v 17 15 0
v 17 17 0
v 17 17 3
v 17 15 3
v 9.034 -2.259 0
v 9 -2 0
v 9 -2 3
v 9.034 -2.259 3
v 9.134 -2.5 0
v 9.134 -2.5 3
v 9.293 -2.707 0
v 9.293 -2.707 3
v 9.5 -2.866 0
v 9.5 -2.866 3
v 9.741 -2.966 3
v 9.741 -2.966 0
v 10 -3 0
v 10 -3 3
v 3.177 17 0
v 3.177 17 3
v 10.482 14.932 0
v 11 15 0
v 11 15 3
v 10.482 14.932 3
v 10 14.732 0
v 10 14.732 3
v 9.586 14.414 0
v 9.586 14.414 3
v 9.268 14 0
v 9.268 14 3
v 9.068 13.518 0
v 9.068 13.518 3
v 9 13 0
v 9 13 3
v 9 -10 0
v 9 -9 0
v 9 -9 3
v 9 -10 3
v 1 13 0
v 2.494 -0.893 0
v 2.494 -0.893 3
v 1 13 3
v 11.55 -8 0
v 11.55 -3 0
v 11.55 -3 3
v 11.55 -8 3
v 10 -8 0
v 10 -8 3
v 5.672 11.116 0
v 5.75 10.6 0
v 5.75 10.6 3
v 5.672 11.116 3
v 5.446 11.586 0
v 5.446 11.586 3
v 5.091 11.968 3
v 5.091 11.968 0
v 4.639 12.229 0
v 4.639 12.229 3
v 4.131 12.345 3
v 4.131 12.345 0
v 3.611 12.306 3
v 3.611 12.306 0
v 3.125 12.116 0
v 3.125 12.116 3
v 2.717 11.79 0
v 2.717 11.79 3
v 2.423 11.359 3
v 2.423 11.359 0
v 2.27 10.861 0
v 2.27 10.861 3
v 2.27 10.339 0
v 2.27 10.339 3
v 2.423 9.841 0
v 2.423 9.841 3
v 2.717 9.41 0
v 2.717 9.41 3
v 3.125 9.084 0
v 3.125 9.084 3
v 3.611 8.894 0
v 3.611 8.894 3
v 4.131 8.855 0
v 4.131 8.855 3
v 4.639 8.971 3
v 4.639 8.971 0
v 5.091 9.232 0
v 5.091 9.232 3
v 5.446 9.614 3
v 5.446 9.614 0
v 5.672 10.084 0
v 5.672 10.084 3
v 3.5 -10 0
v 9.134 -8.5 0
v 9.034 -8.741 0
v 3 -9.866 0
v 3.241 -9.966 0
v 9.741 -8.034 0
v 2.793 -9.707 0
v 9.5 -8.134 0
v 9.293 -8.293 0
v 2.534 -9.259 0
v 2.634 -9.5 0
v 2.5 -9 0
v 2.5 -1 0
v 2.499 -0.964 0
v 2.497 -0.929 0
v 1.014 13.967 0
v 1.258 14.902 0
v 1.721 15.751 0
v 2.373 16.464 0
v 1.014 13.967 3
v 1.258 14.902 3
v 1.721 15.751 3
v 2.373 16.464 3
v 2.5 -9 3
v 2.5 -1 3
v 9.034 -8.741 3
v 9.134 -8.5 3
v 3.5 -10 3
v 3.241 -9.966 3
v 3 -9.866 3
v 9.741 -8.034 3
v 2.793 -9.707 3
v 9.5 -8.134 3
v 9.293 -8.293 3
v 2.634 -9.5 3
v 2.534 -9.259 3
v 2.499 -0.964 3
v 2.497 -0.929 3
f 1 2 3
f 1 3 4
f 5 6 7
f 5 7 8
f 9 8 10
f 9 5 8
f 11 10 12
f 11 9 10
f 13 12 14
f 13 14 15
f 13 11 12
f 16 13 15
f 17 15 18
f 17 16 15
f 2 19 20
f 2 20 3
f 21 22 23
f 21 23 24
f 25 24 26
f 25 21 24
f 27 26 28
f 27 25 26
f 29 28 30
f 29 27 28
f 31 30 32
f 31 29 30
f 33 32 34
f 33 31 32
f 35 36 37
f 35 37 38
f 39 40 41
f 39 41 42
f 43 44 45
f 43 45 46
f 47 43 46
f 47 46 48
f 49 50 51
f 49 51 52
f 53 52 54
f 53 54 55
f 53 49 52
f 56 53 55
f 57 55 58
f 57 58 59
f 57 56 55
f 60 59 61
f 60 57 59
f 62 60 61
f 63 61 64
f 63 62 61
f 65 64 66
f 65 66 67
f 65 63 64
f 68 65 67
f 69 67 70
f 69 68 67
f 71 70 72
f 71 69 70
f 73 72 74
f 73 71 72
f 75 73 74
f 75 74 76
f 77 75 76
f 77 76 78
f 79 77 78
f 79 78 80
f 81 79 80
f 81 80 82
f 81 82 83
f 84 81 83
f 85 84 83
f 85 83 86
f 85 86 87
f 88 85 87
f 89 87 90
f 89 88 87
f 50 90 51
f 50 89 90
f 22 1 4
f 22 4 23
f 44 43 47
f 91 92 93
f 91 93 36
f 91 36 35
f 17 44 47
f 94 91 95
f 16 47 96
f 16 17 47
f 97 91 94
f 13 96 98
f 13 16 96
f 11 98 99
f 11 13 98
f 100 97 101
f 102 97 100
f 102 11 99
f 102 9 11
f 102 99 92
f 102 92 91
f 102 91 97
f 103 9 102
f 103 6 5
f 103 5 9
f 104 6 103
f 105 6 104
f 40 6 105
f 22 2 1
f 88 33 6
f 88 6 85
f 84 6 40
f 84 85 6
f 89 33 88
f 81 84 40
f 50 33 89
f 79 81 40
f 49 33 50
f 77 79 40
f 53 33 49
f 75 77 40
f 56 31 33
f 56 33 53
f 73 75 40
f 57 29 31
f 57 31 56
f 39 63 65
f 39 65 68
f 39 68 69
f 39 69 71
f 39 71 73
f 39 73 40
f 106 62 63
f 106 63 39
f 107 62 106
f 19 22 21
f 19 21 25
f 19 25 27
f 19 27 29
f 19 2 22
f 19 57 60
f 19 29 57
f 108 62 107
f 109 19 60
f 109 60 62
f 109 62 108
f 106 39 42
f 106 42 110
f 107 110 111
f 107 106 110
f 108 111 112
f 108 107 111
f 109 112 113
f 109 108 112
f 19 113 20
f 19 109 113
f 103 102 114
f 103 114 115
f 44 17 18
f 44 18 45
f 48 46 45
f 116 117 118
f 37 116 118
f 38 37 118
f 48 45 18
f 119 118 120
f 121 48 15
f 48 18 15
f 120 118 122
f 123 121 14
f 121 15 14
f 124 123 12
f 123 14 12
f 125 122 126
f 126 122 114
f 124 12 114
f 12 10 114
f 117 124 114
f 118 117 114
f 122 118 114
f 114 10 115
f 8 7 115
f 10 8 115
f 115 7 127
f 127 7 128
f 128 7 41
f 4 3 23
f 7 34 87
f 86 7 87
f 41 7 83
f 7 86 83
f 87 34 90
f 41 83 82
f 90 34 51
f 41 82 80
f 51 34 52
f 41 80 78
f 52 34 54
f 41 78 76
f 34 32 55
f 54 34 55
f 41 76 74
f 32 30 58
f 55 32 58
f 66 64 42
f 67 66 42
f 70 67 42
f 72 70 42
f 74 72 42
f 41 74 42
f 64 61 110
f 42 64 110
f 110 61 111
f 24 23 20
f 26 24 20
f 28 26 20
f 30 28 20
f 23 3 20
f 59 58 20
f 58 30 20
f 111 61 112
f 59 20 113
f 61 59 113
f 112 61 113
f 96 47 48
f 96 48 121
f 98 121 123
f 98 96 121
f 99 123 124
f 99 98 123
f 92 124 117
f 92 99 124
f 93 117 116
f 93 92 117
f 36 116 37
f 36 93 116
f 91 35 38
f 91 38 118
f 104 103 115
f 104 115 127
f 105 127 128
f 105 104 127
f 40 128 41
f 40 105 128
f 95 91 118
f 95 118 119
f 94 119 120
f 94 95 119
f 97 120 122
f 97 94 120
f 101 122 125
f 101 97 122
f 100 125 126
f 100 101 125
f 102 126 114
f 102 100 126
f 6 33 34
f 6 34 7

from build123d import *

# Parameters (mm, degrees)
ESQUISSE1_R        = 1.75
BOSS_EXTRU_1_DEPTH = 3


with BuildPart() as part:
    # Esquisse1 → Boss.-Extru.1 (new body)
    with BuildSketch(Plane.XY):
        with BuildLine():
            Line((3.177327772, 17), (17, 17))
            Line((17, 17), (17, 15))
            Line((17, 15), (11, 15))
            ThreePointArc((11, 15), (9.585786438, 14.414213562), (9, 13))
            Line((9, 13), (9, -2))
            ThreePointArc((9, -2), (9.292893219, -2.707106781), (10, -3))
            Line((10, -3), (11.55, -3))
            Line((11.55, -3), (11.55, -8))
            Line((11.55, -8), (10, -8))
            ThreePointArc((10, -8), (9.292893219, -8.292893219), (9, -9))
            Line((9, -9), (9, -10))
            Line((9, -10), (3.5, -10))
            ThreePointArc((3.5, -10), (2.792893219, -9.707106781), (2.5, -9))
            Line((2.5, -9), (2.5, -1))
            ThreePointArc((2.5, -1), (2.498565392, -0.946454153), (2.494265684, -0.89306194))
            Line((2.494265684, -0.89306194), (1, 13))
            ThreePointArc((1, 13), (1.463823787, 15.340120425), (3.177327772, 17))
        make_face()
        with Locations((4, 10.6)):
            Circle(ESQUISSE1_R, mode=Mode.SUBTRACT)
    extrude(amount=BOSS_EXTRU_1_DEPTH)


solid = part.part
